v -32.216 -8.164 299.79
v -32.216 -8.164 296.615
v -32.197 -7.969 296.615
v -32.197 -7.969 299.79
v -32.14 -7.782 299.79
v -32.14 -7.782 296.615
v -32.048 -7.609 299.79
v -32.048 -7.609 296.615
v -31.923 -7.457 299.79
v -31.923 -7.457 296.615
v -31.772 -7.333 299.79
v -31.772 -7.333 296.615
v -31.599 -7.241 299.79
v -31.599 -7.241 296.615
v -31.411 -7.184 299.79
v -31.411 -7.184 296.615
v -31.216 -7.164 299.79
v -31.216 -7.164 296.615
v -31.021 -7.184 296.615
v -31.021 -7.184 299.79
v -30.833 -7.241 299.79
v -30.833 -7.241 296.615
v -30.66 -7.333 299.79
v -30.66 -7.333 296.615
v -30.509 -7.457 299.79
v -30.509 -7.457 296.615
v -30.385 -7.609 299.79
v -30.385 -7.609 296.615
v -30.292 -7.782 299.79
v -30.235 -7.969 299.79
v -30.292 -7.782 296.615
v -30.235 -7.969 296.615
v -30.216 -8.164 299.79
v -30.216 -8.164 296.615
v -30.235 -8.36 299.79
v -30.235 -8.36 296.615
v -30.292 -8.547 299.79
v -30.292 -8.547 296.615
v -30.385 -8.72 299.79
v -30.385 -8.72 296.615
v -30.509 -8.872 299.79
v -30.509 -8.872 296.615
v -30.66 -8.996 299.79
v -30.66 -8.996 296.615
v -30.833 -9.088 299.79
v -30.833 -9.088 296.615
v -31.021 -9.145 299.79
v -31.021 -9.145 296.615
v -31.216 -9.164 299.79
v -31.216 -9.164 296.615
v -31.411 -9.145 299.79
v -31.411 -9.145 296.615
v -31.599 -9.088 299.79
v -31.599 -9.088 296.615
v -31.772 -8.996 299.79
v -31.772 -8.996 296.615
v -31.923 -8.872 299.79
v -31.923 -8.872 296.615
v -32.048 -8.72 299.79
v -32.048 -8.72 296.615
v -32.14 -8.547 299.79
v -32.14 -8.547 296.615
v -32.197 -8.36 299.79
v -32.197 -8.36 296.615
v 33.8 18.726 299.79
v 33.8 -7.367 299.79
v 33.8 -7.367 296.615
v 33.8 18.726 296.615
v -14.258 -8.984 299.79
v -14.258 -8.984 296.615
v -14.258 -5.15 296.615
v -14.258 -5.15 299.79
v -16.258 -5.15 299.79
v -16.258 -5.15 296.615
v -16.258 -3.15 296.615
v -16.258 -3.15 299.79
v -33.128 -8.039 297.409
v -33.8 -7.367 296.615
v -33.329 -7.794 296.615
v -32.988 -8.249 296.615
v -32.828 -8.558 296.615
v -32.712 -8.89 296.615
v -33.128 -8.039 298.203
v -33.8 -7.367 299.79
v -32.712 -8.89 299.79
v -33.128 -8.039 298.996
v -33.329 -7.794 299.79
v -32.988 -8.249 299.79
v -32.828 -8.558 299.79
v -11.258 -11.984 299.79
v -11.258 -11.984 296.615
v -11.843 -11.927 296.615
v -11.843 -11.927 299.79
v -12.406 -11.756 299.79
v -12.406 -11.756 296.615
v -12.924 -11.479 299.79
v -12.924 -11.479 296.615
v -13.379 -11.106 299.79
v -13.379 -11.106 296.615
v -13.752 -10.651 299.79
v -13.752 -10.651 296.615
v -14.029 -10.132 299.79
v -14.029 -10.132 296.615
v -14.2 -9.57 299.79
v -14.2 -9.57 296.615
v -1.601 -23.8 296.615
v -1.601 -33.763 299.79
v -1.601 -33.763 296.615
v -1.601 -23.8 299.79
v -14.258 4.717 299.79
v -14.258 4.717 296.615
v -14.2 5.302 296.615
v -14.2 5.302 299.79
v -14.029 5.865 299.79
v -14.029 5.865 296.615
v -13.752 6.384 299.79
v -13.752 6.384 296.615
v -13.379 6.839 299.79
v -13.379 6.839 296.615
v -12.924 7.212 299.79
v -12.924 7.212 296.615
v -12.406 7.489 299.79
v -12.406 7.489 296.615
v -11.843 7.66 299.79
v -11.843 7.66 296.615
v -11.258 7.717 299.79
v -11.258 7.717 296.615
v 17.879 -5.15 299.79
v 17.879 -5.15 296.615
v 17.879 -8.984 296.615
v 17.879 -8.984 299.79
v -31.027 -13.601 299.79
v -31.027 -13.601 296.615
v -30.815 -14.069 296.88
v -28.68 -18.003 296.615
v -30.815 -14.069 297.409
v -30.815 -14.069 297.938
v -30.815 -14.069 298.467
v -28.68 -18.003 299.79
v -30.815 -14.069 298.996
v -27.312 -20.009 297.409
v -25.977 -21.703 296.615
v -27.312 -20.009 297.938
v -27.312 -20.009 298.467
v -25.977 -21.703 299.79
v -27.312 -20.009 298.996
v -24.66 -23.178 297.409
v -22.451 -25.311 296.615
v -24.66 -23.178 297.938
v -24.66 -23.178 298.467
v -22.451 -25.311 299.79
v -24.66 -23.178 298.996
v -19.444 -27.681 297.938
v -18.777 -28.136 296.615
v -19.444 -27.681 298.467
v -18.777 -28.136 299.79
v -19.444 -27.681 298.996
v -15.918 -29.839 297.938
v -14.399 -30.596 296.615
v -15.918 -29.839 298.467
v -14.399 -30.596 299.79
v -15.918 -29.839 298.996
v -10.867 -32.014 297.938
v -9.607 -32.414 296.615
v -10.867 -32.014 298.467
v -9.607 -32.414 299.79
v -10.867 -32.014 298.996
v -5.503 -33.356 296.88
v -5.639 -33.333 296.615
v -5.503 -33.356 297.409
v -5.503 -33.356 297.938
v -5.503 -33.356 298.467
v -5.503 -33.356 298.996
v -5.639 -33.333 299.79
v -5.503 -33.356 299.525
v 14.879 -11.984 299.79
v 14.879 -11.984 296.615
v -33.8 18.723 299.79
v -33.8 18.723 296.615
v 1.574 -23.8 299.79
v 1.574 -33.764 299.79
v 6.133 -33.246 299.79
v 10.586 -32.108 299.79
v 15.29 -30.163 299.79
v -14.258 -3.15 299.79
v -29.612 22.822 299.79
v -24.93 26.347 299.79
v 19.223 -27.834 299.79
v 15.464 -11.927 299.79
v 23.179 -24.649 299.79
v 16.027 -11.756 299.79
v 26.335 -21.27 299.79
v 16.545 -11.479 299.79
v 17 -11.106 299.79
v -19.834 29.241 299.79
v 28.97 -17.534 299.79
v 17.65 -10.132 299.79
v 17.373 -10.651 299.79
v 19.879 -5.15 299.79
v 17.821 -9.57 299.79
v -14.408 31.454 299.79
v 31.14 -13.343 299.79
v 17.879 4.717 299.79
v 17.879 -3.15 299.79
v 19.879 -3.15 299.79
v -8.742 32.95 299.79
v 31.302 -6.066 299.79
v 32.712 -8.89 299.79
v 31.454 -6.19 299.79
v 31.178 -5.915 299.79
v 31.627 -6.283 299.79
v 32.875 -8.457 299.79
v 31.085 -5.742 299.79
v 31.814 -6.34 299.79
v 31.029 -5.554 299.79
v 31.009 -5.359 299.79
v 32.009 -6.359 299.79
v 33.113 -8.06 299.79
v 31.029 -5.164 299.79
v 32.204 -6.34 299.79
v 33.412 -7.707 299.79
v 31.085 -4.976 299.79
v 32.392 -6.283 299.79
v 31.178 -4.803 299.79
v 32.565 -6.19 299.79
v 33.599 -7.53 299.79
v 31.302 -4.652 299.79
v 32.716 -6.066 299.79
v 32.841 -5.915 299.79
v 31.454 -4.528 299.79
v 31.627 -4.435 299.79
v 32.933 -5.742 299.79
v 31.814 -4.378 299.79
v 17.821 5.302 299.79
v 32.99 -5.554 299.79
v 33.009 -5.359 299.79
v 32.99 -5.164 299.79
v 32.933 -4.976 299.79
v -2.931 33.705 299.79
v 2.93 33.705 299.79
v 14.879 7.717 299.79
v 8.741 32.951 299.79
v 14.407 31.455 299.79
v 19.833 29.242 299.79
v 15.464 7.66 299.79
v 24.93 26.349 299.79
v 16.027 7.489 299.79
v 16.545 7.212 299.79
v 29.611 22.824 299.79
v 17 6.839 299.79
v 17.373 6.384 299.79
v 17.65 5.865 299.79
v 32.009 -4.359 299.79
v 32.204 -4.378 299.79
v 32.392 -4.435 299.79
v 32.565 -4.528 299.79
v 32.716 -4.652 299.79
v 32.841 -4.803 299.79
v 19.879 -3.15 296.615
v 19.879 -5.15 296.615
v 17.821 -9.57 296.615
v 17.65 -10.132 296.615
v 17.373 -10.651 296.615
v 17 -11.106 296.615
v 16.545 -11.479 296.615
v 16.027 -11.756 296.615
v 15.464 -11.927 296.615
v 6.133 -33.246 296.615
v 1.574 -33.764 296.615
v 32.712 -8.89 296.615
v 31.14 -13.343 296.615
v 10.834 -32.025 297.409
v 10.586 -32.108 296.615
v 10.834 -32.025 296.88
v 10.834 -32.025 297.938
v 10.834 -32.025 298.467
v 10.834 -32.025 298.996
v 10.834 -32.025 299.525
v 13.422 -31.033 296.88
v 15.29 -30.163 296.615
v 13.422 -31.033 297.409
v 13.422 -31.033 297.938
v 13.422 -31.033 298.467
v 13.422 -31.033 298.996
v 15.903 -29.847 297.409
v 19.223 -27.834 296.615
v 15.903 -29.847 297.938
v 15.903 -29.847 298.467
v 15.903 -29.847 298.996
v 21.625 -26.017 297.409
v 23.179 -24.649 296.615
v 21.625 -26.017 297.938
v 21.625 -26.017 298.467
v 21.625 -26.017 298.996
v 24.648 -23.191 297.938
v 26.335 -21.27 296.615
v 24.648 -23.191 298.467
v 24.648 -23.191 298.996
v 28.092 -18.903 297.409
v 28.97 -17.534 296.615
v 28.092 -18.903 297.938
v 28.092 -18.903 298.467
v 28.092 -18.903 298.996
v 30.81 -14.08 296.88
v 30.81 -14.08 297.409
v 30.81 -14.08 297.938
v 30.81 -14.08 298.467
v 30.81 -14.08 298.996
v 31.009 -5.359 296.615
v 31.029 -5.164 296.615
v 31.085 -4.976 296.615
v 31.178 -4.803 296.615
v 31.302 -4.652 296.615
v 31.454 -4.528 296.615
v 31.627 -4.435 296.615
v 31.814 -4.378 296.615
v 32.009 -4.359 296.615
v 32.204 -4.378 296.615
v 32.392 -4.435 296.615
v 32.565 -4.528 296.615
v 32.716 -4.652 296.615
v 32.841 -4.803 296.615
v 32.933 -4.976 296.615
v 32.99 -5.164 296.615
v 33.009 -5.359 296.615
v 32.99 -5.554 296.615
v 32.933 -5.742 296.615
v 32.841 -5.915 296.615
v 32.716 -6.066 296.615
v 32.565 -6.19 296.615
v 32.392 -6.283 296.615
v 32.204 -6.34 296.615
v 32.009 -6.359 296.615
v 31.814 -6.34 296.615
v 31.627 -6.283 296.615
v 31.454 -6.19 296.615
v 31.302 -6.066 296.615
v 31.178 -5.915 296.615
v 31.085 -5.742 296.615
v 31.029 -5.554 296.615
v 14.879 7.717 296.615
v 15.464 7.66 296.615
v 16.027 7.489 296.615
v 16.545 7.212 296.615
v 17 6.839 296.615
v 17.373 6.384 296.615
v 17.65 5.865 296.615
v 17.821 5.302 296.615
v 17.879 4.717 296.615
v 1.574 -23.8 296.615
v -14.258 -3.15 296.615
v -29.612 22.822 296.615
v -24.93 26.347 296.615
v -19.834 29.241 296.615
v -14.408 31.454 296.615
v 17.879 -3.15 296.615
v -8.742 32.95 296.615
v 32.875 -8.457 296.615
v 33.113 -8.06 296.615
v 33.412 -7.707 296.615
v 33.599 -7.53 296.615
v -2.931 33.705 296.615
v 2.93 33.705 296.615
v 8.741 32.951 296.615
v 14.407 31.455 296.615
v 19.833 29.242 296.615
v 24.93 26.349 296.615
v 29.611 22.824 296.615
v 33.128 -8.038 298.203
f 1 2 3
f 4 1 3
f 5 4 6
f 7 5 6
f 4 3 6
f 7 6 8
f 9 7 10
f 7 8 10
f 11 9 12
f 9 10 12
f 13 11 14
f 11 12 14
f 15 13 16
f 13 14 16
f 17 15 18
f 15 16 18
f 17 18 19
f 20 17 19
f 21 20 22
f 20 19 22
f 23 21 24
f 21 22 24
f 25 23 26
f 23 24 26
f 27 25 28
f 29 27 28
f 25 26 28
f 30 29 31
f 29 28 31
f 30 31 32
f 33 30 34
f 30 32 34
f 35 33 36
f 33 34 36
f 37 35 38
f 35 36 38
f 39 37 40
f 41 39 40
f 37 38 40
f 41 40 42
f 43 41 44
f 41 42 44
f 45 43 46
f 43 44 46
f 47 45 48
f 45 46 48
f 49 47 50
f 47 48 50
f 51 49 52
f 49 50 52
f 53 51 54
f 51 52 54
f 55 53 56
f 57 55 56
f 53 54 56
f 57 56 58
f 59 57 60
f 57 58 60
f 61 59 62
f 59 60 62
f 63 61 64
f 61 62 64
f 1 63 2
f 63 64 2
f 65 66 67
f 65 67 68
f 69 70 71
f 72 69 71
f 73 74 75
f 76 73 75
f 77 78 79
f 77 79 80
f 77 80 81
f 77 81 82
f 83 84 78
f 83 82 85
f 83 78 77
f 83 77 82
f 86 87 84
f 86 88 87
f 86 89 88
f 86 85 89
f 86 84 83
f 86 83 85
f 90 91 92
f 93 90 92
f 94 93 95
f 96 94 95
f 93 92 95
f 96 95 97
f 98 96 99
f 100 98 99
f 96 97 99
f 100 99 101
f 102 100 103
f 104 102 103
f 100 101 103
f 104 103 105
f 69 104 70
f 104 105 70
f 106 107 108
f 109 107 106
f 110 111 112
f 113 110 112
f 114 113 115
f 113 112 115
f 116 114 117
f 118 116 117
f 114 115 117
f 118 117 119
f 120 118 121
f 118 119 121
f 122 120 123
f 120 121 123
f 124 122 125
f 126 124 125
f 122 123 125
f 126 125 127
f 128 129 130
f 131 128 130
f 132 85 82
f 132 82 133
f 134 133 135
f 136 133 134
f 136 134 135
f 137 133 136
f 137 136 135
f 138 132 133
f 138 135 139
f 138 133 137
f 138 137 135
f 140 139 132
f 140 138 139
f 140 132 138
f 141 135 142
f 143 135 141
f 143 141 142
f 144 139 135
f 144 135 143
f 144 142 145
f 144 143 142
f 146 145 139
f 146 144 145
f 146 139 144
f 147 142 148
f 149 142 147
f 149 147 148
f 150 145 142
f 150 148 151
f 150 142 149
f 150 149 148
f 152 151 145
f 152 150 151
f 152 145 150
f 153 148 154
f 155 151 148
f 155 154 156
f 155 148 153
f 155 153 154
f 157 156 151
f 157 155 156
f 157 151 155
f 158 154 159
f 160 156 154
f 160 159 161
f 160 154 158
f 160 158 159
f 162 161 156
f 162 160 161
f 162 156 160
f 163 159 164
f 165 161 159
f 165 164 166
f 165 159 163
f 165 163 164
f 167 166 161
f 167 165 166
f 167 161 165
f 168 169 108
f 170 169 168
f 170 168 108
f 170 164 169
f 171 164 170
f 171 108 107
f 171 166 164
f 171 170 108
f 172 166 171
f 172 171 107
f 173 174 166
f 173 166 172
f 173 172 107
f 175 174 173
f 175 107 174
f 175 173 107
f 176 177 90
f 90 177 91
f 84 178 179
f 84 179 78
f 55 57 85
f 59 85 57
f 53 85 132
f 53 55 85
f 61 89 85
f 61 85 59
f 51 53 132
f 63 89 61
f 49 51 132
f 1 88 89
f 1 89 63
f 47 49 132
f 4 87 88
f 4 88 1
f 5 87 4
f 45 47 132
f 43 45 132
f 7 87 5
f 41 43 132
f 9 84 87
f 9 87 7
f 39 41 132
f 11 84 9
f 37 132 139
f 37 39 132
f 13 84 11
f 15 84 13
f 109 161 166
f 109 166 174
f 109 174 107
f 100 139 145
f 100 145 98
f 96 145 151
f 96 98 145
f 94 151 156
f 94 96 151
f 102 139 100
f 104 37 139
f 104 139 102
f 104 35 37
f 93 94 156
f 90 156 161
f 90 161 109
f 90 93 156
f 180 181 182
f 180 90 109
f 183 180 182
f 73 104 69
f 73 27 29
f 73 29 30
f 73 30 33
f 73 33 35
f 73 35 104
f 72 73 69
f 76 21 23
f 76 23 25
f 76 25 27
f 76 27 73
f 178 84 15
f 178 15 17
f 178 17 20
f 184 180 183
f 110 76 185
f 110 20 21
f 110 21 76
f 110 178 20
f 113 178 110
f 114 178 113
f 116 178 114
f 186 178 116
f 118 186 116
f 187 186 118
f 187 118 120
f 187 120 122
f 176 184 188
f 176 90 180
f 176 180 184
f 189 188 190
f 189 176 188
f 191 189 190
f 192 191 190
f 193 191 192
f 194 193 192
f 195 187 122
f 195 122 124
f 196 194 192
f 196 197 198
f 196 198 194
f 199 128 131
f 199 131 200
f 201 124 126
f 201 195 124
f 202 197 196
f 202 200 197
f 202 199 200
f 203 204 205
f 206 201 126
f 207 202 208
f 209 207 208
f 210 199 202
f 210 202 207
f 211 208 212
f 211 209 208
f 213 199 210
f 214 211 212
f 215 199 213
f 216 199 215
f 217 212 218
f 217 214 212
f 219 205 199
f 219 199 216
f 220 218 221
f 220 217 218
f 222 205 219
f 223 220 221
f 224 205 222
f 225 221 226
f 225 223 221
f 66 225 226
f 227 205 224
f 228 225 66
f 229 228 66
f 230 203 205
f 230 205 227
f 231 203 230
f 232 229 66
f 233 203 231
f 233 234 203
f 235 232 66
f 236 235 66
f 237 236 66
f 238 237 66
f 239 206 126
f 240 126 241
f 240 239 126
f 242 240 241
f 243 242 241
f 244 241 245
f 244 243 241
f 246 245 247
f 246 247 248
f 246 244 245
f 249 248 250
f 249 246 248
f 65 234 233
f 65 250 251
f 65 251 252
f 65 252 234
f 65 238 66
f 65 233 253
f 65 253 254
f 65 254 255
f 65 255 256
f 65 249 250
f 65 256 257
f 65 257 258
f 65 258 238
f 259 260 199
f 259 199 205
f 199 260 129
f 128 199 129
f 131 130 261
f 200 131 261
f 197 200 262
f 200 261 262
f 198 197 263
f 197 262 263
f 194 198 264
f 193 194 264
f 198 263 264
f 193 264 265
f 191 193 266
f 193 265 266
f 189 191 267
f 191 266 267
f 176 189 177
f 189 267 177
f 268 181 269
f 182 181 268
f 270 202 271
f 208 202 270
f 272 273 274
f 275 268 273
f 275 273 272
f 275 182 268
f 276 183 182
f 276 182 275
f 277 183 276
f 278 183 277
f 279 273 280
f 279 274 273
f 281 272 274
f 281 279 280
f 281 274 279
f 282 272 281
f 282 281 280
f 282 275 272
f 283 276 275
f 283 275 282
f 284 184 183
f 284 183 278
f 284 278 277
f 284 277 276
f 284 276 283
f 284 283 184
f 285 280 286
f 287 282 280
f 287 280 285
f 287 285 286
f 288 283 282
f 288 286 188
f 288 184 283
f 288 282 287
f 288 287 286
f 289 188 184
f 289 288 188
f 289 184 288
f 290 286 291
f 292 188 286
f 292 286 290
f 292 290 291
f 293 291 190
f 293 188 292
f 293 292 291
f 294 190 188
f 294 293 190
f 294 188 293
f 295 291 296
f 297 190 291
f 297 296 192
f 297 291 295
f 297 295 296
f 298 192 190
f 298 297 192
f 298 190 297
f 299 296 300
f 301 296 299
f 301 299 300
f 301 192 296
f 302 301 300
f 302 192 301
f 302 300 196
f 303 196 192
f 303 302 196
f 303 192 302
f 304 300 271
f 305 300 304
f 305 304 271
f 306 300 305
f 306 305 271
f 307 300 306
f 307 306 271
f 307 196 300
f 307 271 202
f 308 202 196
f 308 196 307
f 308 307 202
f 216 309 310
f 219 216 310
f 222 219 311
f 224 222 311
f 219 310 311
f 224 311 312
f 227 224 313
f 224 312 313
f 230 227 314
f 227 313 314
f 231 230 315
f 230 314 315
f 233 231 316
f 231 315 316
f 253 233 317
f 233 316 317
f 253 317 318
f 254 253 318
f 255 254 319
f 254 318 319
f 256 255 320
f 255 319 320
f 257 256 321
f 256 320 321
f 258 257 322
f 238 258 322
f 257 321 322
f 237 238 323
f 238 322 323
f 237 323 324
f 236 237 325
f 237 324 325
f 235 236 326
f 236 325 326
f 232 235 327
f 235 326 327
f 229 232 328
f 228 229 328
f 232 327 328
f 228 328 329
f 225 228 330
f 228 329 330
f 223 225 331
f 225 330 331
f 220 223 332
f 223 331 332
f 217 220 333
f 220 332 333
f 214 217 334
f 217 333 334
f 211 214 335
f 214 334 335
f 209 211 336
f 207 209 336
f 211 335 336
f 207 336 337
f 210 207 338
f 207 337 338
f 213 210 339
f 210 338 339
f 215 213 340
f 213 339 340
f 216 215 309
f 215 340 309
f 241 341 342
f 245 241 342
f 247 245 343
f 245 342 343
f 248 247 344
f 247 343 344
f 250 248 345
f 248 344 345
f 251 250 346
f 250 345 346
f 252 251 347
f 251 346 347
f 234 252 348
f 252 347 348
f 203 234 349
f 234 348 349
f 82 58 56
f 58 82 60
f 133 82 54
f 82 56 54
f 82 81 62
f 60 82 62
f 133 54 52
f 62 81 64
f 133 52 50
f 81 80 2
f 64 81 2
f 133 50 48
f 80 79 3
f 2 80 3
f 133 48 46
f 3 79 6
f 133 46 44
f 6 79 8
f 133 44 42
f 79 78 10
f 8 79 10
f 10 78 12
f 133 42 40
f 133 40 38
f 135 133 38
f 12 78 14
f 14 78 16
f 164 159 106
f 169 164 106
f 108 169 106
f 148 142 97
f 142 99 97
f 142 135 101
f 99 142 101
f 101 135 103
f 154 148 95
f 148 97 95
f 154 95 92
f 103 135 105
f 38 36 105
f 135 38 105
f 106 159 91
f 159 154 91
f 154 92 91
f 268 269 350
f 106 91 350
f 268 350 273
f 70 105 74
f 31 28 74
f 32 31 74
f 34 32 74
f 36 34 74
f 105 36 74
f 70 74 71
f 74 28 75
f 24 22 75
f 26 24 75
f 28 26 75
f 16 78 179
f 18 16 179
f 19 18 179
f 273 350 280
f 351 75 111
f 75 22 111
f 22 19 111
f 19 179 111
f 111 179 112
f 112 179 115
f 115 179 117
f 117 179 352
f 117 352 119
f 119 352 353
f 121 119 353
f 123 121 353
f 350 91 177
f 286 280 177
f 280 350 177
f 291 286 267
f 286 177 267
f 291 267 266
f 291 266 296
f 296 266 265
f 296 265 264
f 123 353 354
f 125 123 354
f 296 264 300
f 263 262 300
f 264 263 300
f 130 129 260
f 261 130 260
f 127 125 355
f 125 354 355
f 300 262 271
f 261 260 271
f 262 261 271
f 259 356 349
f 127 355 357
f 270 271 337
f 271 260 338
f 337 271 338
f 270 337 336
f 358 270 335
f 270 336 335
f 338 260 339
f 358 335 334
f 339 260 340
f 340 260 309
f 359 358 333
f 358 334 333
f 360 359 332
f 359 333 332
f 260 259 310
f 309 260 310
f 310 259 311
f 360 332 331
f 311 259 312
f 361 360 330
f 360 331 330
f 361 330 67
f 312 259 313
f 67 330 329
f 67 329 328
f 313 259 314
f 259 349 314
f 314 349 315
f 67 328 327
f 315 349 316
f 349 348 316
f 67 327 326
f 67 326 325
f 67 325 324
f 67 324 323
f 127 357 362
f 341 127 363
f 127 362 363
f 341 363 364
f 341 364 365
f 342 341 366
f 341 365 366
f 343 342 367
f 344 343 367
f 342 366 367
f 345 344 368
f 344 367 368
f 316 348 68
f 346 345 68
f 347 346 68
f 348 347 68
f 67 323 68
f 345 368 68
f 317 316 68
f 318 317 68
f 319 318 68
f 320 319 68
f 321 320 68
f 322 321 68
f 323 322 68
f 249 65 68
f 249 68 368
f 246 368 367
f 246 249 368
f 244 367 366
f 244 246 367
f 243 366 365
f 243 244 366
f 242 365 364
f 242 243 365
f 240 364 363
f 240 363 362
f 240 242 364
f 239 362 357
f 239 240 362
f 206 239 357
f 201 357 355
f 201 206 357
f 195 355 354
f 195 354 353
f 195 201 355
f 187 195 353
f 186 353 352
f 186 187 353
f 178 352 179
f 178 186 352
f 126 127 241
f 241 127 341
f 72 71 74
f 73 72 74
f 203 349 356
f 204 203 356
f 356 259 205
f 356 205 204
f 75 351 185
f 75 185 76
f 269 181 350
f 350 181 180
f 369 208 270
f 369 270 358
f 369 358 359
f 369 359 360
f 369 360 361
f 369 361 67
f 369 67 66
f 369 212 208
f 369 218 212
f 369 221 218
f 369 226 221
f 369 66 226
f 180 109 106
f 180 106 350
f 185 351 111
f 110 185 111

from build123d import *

# Parameters (mm, degrees)
BOSS_EXTRUDE1_DEPTH = 3.175
SKETCH2_R           = 1
CUT_EXTRUDE1_DEPTH  = 3.175
SKETCH3_W           = 3.175
SKETCH3_H           = 10.970571453
CUT_EXTRUDE2_DEPTH  = 48.905483945
SKETCH4_W           = 2
SKETCH4_H           = 2
CUT_EXTRUDE3_DEPTH  = 48.905483945


with BuildPart() as part:
    # Sketch1 → Boss-Extrude1 (new body)
    with BuildSketch(Plane.XY.offset(299.790013628)):
        with BuildLine():
            Line((33.800017398, -7.366761895), (33.800017398, 18.725816778))
            ThreePointArc((33.800017398, 18.725816778), (-0.000557823, 33.799609088), (-33.799982602, 18.723237361))
            Line((-33.799982602, 18.723237361), (-33.799982602, -7.366777732))
            add(Edge.make_bspline(
                [(-33.799982602, -7.366777732), (-33.672789327, -7.463259542), (-33.552121131, -7.566964097), (-33.326159842, -7.79139223), (-33.221125409, -7.912162508), (-33.034465703, -8.166471978), (-32.952054517, -8.300699067), (-32.811712114, -8.585009668), (-32.753980555, -8.735399478), (-32.711505515, -8.889768336)],
                knots=[0, 0, 0, 0, 0.25, 0.25, 0.5, 0.5, 0.75, 0.75, 1, 1, 1, 1], degree=3))
            add(Edge.make_bspline(
                [(-32.711505515, -8.889768336), (-32.218545569, -10.681353815), (-31.582970442, -12.406292143), (-30.046873209, -15.732353364), (-29.149732094, -17.335056266), (-27.853684449, -19.256830618), (-27.585876179, -19.636654103), (-27.037545067, -20.380994298), (-26.194235478, -21.477177142), (-25.289410486, -22.513279461), (-23.400136465, -24.507717332), (-22.036872596, -25.736014695), (-20.198644798, -27.140367507), (-19.823359112, -27.415057973), (-18.307010857, -28.47732838), (-17.130998838, -29.195842865), (-14.299650354, -30.696188469), (-12.615858618, -31.420604816), (-9.99268241, -32.310524634), (-9.099644071, -32.573674181), (-7.309378259, -33.021437293), (-4.607325738, -33.579354316), (-1.855822888, -33.799578534), (7.014e-06, -33.799609106)],
                knots=[0, 0, 0, 0, 0.125, 0.125, 0.25, 0.25, 0.28125, 0.28125, 0.3125, 0.375, 0.375, 0.5, 0.5, 0.53125, 0.53125, 0.625, 0.625, 0.75, 0.75, 0.8125, 0.8125, 0.875, 1, 1, 1, 1], degree=3))
            add(Edge.make_bspline(
                [(7.014e-06, -33.799609106), (3.71198449, -33.799546475), (7.323818522, -33.211894011), (11.272281305, -31.876901766), (11.709255106, -31.719210387), (12.572214597, -31.3883335), (13.853276296, -30.867912798), (16.748236975, -29.483886242), (19.066155809, -28.003005579), (20.904820016, -26.601476418), (21.26870544, -26.312112405), (21.981822477, -25.721047769), (22.331302421, -25.41922276), (23.359250005, -24.495530592), (25.333391288, -22.575468921), (27.05775769, -20.433363088), (28.609537919, -18.137832091), (29.098956145, -17.344856534), (30.005077972, -15.734456147), (30.424297285, -14.914397351), (31.581811664, -12.410251613), (32.218491785, -10.681549287), (32.711505515, -8.889768336)],
                knots=[0, 0, 0, 0, 0.25, 0.25, 0.28125, 0.28125, 0.3125, 0.375, 0.5, 0.5, 0.53125, 0.53125, 0.5625, 0.5625, 0.625, 0.75, 0.75, 0.8125, 0.8125, 0.875, 0.875, 1, 1, 1, 1], degree=3))
            add(Edge.make_bspline(
                [(32.711505515, -8.889768336), (32.79670017, -8.580141747), (32.939002514, -8.296331804), (33.317854255, -7.780583107), (33.545155986, -7.560077249), (33.800017398, -7.366761895)],
                knots=[0, 0, 0, 0, 0.5, 0.5, 1, 1, 1, 1], degree=3))
        make_face()
    extrude(amount=-BOSS_EXTRUDE1_DEPTH)

    # Sketch2 → Cut-Extrude1 (cut)
    with BuildSketch(Plane(origin=(0, 0, 296.615013628), x_dir=(-1, 0, 0), z_dir=(0, 0, -1))):
        with Locations((-32.009302375, -5.358989516)):
            Circle(SKETCH2_R)
        with Locations((31.216064399, -8.164436653)):
            Circle(SKETCH2_R)
    extrude(amount=-CUT_EXTRUDE1_DEPTH, mode=Mode.SUBTRACT)

    # Sketch3 → Cut-Extrude2 (cut, through all)
    with BuildSketch(Plane.XY.offset(299.790013628)):
        with Locations((-0.013127042, -29.284890239)):
            Rectangle(SKETCH3_W, SKETCH3_H)
    extrude(amount=-CUT_EXTRUDE2_DEPTH, mode=Mode.SUBTRACT)

    # Sketch4 → Cut-Extrude3 (cut, through all)
    with BuildSketch(Plane(origin=(0, 0, 296.615013628), x_dir=(-1, 0, 0), z_dir=(0, 0, -1))):
        with BuildLine():
            Line((14.257724699, -8.984256283), (14.257724699, 4.717183699))
            ThreePointArc((14.257724699, 4.717183699), (13.379045042, 6.838504042), (11.257724699, 7.717183699))
            Line((11.257724699, 7.717183699), (-14.878600613, 7.717183699))
            ThreePointArc((-14.878600613, 7.717183699), (-16.999920956, 6.838504042), (-17.878600613, 4.717183699))
            Line((-17.878600613, 4.717183699), (-17.878600613, -8.984256283))
            ThreePointArc((-17.878600613, -8.984256283), (-16.999920956, -11.105576627), (-14.878600613, -11.984256283))
            Line((-14.878600613, -11.984256283), (11.257724699, -11.984256283))
            ThreePointArc((11.257724699, -11.984256283), (13.379045042, -11.105576627), (14.257724699, -8.984256283))
        make_face()
        with Locations((15.257724699, -4.150157902)):
            Rectangle(SKETCH4_W, SKETCH4_H)
        with Locations((-18.878600613, -4.150157902)):
            Rectangle(SKETCH4_W, SKETCH4_H)
    extrude(amount=-CUT_EXTRUDE3_DEPTH, mode=Mode.SUBTRACT)


solid = part.part
